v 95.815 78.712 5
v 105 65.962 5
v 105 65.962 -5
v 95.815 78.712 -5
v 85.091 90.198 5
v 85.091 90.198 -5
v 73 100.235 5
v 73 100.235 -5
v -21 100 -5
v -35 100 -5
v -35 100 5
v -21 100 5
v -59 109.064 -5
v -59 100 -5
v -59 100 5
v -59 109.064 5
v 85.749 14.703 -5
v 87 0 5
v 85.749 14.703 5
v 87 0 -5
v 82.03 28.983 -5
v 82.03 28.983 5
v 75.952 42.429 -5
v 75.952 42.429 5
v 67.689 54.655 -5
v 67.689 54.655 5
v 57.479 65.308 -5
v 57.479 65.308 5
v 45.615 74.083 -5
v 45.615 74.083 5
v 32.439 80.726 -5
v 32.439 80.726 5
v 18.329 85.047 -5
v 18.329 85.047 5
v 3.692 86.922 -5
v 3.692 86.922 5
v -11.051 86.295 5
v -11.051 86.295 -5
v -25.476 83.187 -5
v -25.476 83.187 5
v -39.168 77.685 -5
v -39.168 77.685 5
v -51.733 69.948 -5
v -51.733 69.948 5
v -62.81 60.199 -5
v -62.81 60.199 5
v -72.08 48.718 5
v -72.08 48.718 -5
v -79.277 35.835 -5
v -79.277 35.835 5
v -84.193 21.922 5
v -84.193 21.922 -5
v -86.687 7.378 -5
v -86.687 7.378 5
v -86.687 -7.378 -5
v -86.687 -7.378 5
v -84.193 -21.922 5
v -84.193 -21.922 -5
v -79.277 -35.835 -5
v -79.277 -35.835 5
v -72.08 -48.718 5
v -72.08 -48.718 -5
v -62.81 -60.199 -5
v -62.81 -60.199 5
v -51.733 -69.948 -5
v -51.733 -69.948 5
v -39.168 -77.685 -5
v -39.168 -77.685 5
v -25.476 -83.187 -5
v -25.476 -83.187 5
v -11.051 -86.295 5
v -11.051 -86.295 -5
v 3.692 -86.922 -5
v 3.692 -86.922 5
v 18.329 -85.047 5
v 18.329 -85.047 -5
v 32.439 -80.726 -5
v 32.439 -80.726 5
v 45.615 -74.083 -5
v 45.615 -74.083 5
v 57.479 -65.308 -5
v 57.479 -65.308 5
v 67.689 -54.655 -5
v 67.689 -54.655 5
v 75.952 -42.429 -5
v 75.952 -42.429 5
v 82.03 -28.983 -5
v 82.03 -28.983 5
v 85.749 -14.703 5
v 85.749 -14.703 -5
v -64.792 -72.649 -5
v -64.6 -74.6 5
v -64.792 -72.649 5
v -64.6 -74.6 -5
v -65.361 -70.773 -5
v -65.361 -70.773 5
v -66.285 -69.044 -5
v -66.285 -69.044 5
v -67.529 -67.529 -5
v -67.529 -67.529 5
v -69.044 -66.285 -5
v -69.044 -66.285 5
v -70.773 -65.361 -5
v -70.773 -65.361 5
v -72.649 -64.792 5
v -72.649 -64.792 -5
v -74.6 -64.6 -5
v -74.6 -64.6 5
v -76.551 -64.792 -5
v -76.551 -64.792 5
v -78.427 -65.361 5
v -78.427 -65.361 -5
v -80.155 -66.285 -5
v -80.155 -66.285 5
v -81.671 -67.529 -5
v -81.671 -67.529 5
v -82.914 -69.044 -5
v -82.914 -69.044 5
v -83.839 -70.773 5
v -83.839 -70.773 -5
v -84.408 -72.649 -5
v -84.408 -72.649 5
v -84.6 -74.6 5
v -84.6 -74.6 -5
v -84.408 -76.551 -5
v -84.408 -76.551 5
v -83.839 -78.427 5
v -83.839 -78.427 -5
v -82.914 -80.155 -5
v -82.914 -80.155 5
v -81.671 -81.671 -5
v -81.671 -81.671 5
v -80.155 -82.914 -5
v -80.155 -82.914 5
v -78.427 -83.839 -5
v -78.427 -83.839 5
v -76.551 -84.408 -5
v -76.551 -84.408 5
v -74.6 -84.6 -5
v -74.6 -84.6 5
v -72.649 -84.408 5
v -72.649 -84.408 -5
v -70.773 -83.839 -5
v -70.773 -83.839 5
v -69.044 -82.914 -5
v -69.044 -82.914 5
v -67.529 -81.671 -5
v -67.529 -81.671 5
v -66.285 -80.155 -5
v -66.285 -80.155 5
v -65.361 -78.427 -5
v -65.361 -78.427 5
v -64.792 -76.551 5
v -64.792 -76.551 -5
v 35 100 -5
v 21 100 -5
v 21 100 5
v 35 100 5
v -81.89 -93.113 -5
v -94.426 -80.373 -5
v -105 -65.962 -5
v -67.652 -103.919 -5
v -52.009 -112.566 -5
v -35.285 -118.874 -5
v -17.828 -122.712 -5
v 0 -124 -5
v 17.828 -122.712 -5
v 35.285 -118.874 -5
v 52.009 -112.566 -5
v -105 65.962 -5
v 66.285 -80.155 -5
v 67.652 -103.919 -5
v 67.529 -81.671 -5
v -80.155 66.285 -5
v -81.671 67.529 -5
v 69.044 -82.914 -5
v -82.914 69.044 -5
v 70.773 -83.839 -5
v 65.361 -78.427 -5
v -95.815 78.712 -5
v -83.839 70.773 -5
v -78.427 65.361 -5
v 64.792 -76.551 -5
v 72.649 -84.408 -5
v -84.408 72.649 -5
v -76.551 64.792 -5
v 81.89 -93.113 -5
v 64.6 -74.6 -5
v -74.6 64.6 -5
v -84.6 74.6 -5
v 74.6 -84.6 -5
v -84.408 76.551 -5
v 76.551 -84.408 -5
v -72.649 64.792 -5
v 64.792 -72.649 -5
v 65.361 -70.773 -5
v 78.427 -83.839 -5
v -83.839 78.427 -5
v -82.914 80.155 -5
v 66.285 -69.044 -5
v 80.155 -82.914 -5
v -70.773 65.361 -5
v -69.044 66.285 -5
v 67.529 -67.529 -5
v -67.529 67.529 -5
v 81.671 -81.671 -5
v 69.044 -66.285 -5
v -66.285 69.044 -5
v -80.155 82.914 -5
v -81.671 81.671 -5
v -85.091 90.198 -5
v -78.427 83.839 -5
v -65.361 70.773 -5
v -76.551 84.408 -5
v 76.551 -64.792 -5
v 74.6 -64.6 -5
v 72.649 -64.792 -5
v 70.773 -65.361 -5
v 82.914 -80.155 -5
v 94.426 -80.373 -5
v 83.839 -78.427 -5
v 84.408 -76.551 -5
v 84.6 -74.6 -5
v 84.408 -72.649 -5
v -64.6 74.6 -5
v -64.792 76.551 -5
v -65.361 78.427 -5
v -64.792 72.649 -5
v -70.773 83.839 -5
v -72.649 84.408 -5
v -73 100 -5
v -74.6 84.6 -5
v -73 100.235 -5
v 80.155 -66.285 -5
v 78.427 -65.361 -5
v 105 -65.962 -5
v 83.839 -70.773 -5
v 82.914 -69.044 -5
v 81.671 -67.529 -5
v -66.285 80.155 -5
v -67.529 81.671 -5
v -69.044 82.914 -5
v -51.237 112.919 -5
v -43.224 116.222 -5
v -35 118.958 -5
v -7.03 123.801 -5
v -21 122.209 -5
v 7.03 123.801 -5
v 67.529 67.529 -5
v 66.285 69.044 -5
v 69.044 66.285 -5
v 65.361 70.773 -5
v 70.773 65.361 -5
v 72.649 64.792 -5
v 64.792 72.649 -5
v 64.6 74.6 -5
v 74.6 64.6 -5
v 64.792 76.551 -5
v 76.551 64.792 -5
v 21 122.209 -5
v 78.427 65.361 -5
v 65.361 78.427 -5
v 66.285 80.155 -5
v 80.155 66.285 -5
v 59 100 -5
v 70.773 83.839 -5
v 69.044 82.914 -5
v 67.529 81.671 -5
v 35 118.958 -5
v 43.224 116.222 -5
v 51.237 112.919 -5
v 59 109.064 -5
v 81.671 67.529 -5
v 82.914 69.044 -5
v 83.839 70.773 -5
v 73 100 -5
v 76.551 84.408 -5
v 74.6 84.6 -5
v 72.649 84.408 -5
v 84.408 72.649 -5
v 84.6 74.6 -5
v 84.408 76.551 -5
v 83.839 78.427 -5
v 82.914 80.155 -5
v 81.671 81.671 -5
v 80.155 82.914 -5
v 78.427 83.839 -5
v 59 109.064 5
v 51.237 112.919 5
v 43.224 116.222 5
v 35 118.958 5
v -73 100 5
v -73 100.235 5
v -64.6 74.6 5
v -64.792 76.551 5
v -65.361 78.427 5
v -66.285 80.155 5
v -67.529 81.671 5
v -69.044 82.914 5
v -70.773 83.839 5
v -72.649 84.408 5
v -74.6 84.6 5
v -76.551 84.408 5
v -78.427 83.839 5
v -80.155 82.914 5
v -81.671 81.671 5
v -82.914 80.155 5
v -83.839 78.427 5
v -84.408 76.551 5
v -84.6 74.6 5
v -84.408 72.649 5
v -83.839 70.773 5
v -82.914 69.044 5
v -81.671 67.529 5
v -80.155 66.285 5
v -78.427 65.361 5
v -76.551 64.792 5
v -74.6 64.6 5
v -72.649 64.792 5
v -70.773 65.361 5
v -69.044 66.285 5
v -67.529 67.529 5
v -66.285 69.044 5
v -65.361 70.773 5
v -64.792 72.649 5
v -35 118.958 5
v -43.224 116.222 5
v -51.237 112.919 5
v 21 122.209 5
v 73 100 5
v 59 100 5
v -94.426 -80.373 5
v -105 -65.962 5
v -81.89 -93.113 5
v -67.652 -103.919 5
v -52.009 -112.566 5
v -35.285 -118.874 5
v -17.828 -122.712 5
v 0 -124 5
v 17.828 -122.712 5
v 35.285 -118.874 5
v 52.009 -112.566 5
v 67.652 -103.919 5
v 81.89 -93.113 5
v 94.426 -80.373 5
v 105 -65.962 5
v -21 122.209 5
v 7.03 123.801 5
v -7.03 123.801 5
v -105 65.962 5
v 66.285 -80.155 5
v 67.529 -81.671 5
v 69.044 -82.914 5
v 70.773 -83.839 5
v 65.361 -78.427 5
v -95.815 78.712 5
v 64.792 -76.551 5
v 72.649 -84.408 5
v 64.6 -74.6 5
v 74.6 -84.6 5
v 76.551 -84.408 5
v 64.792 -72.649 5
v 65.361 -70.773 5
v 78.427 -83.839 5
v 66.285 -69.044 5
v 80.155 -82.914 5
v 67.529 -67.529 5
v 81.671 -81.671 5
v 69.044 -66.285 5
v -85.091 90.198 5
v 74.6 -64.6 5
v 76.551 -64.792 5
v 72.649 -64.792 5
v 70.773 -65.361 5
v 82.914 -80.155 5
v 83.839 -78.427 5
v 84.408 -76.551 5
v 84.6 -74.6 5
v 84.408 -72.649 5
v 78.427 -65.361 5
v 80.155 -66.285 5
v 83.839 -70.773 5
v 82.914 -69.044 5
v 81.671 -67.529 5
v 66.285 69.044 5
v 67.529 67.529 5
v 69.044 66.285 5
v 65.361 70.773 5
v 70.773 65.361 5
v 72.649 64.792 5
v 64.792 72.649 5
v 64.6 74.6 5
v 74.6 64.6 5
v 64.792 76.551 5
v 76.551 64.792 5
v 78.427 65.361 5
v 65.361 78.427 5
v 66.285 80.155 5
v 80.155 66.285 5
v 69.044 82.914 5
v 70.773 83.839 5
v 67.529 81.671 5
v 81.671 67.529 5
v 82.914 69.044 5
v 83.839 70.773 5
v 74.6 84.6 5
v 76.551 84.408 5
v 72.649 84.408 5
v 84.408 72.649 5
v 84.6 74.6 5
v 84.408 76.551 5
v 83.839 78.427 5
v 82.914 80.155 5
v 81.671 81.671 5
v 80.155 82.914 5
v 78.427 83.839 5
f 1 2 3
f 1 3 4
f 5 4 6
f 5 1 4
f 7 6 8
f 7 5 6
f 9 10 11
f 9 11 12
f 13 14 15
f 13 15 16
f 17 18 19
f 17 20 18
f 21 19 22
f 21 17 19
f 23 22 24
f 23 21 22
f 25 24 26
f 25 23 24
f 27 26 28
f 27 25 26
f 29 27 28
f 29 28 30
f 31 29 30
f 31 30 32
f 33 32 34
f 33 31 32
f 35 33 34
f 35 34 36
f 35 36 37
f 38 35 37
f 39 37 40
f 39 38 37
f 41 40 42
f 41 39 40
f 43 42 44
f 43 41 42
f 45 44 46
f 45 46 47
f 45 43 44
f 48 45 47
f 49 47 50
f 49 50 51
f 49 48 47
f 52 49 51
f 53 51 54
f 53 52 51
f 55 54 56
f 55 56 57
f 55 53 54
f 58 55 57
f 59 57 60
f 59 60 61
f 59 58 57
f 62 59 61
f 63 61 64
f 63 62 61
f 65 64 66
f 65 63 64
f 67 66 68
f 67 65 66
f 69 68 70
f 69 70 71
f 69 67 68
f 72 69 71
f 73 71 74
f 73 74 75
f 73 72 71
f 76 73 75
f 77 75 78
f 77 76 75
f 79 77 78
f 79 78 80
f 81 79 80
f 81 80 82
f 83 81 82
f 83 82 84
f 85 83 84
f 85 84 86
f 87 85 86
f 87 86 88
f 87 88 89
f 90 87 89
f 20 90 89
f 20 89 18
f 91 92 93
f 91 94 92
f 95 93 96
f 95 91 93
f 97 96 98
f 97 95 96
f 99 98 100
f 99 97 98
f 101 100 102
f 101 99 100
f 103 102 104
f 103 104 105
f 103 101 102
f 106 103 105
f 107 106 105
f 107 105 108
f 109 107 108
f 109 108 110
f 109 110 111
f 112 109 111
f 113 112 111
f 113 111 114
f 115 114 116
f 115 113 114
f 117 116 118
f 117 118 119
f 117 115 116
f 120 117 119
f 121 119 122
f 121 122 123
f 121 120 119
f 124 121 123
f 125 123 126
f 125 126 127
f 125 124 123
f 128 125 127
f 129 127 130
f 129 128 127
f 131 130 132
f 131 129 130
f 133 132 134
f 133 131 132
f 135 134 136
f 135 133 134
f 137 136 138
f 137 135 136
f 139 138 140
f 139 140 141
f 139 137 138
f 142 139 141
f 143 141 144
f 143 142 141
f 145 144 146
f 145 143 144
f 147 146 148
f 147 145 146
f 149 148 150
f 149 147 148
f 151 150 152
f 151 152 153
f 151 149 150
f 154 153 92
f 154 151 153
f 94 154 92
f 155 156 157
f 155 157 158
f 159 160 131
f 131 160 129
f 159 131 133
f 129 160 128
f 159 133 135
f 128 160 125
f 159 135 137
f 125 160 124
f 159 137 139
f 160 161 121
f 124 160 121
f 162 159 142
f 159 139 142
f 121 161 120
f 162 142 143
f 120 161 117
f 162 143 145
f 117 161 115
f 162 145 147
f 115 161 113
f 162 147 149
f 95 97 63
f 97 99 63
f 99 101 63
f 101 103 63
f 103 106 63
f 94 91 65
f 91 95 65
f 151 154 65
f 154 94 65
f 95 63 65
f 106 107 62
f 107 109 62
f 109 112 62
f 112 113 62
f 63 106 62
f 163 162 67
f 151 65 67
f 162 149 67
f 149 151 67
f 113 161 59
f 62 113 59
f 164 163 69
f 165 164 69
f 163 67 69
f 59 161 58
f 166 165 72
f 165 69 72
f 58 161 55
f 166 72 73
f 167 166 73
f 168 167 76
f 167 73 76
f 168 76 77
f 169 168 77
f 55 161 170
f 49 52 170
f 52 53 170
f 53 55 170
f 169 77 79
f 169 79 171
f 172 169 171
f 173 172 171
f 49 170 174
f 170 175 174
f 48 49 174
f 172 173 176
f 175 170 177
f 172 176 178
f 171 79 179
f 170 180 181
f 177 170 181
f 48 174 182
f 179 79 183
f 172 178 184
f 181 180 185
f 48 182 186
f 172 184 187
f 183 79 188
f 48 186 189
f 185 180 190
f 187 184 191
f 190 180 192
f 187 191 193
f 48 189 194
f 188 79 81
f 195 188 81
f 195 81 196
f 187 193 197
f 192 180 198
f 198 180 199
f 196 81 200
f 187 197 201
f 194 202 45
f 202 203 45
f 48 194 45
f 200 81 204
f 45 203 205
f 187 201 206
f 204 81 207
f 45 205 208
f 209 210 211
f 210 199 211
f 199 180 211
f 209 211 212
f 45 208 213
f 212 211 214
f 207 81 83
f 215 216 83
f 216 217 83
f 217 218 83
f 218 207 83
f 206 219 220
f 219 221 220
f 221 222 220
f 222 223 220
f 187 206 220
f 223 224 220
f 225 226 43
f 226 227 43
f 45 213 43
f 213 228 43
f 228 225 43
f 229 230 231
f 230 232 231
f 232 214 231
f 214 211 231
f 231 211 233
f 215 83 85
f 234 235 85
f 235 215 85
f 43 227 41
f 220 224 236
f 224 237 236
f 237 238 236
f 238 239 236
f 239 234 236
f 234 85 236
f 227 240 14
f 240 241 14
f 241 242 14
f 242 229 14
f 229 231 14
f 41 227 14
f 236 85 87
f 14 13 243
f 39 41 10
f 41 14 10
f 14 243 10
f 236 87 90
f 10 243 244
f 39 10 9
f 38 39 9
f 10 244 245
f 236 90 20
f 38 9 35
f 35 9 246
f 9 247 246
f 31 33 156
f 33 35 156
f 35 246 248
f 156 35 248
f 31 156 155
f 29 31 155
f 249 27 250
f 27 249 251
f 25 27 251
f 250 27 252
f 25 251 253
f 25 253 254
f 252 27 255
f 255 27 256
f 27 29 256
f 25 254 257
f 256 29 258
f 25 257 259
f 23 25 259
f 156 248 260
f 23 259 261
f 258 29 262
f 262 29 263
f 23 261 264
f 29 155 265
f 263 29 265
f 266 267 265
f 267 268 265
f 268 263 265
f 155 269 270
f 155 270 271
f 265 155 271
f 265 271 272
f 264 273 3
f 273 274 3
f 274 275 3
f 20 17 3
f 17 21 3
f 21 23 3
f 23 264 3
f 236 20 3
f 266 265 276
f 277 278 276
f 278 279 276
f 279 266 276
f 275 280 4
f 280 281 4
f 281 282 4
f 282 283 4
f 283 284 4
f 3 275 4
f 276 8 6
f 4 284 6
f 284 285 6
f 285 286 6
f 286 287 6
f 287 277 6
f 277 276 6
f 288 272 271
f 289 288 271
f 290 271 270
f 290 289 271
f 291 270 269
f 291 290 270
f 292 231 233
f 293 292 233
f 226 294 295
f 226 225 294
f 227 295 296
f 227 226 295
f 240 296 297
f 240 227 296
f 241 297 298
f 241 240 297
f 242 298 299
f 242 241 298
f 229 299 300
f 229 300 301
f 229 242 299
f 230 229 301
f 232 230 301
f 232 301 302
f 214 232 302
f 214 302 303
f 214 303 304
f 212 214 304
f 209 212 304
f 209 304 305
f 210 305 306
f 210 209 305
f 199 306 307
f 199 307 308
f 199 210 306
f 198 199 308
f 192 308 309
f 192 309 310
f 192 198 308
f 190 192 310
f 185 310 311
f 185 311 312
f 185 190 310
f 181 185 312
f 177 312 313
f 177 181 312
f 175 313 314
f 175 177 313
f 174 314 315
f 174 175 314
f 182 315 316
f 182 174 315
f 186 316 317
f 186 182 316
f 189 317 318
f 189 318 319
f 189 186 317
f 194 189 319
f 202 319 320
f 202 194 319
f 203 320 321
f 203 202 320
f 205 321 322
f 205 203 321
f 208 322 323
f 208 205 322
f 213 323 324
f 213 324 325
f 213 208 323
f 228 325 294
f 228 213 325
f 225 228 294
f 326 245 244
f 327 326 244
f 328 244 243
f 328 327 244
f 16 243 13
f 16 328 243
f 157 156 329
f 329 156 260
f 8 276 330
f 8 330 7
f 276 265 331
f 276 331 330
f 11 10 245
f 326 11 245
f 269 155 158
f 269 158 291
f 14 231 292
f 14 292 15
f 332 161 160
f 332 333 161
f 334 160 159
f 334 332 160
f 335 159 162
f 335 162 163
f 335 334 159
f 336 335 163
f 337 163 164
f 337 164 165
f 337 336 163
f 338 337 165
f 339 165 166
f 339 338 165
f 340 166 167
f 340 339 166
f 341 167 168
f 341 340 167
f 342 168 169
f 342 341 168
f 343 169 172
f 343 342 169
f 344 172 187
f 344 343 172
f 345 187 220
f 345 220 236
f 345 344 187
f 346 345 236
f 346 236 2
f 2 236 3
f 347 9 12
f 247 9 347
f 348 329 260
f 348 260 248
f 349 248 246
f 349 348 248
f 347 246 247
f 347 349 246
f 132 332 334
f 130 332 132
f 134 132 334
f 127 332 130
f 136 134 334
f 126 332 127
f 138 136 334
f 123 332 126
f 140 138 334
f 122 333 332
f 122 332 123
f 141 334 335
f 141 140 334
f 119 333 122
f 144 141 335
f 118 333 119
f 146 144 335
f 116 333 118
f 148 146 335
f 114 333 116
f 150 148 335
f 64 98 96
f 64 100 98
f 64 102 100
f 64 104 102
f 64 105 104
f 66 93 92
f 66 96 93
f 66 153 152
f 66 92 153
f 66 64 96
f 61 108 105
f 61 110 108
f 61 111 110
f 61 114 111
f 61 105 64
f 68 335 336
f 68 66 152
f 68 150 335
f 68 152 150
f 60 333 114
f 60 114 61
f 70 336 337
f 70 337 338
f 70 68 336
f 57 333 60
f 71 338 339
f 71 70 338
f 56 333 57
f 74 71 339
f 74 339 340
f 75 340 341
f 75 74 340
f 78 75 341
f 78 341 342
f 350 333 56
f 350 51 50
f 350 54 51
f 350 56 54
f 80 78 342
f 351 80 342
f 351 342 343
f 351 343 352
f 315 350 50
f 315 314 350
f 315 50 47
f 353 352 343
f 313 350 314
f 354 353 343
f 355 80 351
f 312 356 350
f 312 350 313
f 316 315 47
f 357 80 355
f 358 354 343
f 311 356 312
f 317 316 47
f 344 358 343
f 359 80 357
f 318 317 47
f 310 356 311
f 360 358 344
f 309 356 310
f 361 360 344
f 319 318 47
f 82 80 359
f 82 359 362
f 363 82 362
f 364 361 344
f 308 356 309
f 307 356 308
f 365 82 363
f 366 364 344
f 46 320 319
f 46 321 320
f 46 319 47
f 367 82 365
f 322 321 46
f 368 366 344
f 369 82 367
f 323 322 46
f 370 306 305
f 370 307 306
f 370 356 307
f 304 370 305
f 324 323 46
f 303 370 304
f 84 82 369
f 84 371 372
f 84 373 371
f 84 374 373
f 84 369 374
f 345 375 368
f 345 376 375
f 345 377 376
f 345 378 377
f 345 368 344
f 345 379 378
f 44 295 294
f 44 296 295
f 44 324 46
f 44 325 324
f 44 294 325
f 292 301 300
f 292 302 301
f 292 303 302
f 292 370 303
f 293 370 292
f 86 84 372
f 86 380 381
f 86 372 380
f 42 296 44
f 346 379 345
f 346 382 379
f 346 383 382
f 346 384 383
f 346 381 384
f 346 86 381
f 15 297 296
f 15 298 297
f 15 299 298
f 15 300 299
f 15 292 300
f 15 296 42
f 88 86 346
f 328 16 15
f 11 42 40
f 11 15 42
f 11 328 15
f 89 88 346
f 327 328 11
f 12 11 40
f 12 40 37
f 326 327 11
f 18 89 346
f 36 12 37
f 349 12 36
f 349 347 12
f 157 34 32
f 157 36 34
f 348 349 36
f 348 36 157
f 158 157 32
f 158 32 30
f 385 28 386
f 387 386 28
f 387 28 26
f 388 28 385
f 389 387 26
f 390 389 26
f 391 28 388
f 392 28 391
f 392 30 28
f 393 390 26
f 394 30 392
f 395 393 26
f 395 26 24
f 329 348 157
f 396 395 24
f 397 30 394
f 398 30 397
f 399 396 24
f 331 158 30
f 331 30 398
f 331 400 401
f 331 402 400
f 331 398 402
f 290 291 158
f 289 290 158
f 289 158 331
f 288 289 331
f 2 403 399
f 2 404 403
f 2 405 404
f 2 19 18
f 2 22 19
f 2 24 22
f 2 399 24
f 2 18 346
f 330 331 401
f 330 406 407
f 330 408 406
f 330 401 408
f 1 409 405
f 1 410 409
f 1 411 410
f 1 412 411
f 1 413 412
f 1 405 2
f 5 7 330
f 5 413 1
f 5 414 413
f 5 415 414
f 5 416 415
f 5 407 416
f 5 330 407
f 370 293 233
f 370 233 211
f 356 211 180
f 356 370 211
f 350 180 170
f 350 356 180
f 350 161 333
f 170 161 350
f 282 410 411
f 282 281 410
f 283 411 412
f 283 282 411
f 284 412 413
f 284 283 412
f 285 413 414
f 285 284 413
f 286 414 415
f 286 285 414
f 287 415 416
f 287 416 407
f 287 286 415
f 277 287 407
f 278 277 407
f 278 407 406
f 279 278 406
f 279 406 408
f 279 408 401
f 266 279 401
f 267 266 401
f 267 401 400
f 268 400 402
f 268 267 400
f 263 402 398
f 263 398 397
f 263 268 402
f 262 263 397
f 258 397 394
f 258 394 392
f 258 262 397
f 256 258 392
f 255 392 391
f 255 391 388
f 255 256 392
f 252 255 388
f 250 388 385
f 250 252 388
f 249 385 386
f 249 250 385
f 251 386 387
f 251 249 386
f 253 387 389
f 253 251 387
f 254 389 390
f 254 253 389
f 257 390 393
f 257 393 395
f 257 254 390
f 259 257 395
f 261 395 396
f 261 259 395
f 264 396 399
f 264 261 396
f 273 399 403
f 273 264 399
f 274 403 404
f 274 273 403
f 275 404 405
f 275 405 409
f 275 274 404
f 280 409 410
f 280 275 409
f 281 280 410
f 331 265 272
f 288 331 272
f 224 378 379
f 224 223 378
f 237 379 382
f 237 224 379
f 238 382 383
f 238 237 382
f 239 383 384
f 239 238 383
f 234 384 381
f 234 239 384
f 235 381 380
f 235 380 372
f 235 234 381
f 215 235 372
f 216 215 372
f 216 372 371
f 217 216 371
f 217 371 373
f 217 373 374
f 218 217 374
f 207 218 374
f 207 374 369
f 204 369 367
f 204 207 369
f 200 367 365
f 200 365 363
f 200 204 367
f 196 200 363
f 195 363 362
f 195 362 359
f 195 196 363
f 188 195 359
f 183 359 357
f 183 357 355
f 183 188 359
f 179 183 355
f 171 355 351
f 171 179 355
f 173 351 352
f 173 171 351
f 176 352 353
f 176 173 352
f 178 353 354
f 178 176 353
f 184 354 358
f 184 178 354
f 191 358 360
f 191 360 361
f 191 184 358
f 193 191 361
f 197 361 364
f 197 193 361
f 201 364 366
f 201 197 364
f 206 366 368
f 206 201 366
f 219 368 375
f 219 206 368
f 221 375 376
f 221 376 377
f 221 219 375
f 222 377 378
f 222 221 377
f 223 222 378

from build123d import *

# Parameters (mm, degrees)
SKETCH_1_R               = 124
SKETCH_1_R_2             = 87
SKETCH_1_R_3             = 10
EXTRUDE_1_DEPTH          = 5
CUT_EXTRUDE_1_DEPTH      = 176.64737402
CUT_EXTRUDE_1_DEPTH_BACK = 176.64737402
SKETCH_2_OUTSIDE_W       = 320.174
SKETCH_2_OUTSIDE_H       = 320.174
SKETCH_2_OUTSIDE_W_2     = 210
SKETCH_2_OUTSIDE_H_2     = 280
CUT_EXTRUDE_2_DEPTH      = 163.791277408
CUT_EXTRUDE_2_DEPTH_BACK = 163.791277408
SKETCH_3_W               = 14
SKETCH_3_H               = 48


with BuildPart() as part:
    # Эскиз1 → Бобышка-Вытянуть1 (new, symmetric)
    with BuildSketch(Plane.XY):
        Circle(SKETCH_1_R)
        Circle(SKETCH_1_R_2, mode=Mode.SUBTRACT)
        with Locations((74.599765415, 74.599765415)):
            Circle(SKETCH_1_R_3, mode=Mode.SUBTRACT)
        with Locations((74.599765415, -74.599765415)):
            Circle(SKETCH_1_R_3, mode=Mode.SUBTRACT)
        with Locations((-74.599765415, -74.599765415)):
            Circle(SKETCH_1_R_3, mode=Mode.SUBTRACT)
        with Locations((-74.599765415, 74.599765415)):
            Circle(SKETCH_1_R_3, mode=Mode.SUBTRACT)
    extrude(amount=EXTRUDE_1_DEPTH, both=True)

    # Эскиз2 outside → Вырез-Вытянуть1 (cut, two sides: drawn at the far end of the back side and taken through both)
    with BuildSketch(Plane.XY.offset(5).offset(-CUT_EXTRUDE_1_DEPTH_BACK)):
        Rectangle(SKETCH_2_OUTSIDE_W, SKETCH_2_OUTSIDE_H)
        Rectangle(SKETCH_2_OUTSIDE_W_2, SKETCH_2_OUTSIDE_H_2, mode=Mode.SUBTRACT)
    extrude(amount=CUT_EXTRUDE_1_DEPTH + CUT_EXTRUDE_1_DEPTH_BACK, mode=Mode.SUBTRACT)

    # Эскиз3 → Вырез-Вытянуть2 (cut, two sides: drawn at the far end of the back side and taken through both)
    with BuildSketch(Plane.XY.offset(5).offset(-CUT_EXTRUDE_2_DEPTH_BACK)):
        with Locations((-66, 124)):
            Rectangle(SKETCH_3_W, SKETCH_3_H)
        with Locations((66, 124)):
            Rectangle(SKETCH_3_W, SKETCH_3_H)
        with Locations((28, 124)):
            Rectangle(SKETCH_3_W, SKETCH_3_H)
        with Locations((-28, 124)):
            Rectangle(SKETCH_3_W, SKETCH_3_H)
    extrude(amount=CUT_EXTRUDE_2_DEPTH + CUT_EXTRUDE_2_DEPTH_BACK, mode=Mode.SUBTRACT)


solid = part.part
